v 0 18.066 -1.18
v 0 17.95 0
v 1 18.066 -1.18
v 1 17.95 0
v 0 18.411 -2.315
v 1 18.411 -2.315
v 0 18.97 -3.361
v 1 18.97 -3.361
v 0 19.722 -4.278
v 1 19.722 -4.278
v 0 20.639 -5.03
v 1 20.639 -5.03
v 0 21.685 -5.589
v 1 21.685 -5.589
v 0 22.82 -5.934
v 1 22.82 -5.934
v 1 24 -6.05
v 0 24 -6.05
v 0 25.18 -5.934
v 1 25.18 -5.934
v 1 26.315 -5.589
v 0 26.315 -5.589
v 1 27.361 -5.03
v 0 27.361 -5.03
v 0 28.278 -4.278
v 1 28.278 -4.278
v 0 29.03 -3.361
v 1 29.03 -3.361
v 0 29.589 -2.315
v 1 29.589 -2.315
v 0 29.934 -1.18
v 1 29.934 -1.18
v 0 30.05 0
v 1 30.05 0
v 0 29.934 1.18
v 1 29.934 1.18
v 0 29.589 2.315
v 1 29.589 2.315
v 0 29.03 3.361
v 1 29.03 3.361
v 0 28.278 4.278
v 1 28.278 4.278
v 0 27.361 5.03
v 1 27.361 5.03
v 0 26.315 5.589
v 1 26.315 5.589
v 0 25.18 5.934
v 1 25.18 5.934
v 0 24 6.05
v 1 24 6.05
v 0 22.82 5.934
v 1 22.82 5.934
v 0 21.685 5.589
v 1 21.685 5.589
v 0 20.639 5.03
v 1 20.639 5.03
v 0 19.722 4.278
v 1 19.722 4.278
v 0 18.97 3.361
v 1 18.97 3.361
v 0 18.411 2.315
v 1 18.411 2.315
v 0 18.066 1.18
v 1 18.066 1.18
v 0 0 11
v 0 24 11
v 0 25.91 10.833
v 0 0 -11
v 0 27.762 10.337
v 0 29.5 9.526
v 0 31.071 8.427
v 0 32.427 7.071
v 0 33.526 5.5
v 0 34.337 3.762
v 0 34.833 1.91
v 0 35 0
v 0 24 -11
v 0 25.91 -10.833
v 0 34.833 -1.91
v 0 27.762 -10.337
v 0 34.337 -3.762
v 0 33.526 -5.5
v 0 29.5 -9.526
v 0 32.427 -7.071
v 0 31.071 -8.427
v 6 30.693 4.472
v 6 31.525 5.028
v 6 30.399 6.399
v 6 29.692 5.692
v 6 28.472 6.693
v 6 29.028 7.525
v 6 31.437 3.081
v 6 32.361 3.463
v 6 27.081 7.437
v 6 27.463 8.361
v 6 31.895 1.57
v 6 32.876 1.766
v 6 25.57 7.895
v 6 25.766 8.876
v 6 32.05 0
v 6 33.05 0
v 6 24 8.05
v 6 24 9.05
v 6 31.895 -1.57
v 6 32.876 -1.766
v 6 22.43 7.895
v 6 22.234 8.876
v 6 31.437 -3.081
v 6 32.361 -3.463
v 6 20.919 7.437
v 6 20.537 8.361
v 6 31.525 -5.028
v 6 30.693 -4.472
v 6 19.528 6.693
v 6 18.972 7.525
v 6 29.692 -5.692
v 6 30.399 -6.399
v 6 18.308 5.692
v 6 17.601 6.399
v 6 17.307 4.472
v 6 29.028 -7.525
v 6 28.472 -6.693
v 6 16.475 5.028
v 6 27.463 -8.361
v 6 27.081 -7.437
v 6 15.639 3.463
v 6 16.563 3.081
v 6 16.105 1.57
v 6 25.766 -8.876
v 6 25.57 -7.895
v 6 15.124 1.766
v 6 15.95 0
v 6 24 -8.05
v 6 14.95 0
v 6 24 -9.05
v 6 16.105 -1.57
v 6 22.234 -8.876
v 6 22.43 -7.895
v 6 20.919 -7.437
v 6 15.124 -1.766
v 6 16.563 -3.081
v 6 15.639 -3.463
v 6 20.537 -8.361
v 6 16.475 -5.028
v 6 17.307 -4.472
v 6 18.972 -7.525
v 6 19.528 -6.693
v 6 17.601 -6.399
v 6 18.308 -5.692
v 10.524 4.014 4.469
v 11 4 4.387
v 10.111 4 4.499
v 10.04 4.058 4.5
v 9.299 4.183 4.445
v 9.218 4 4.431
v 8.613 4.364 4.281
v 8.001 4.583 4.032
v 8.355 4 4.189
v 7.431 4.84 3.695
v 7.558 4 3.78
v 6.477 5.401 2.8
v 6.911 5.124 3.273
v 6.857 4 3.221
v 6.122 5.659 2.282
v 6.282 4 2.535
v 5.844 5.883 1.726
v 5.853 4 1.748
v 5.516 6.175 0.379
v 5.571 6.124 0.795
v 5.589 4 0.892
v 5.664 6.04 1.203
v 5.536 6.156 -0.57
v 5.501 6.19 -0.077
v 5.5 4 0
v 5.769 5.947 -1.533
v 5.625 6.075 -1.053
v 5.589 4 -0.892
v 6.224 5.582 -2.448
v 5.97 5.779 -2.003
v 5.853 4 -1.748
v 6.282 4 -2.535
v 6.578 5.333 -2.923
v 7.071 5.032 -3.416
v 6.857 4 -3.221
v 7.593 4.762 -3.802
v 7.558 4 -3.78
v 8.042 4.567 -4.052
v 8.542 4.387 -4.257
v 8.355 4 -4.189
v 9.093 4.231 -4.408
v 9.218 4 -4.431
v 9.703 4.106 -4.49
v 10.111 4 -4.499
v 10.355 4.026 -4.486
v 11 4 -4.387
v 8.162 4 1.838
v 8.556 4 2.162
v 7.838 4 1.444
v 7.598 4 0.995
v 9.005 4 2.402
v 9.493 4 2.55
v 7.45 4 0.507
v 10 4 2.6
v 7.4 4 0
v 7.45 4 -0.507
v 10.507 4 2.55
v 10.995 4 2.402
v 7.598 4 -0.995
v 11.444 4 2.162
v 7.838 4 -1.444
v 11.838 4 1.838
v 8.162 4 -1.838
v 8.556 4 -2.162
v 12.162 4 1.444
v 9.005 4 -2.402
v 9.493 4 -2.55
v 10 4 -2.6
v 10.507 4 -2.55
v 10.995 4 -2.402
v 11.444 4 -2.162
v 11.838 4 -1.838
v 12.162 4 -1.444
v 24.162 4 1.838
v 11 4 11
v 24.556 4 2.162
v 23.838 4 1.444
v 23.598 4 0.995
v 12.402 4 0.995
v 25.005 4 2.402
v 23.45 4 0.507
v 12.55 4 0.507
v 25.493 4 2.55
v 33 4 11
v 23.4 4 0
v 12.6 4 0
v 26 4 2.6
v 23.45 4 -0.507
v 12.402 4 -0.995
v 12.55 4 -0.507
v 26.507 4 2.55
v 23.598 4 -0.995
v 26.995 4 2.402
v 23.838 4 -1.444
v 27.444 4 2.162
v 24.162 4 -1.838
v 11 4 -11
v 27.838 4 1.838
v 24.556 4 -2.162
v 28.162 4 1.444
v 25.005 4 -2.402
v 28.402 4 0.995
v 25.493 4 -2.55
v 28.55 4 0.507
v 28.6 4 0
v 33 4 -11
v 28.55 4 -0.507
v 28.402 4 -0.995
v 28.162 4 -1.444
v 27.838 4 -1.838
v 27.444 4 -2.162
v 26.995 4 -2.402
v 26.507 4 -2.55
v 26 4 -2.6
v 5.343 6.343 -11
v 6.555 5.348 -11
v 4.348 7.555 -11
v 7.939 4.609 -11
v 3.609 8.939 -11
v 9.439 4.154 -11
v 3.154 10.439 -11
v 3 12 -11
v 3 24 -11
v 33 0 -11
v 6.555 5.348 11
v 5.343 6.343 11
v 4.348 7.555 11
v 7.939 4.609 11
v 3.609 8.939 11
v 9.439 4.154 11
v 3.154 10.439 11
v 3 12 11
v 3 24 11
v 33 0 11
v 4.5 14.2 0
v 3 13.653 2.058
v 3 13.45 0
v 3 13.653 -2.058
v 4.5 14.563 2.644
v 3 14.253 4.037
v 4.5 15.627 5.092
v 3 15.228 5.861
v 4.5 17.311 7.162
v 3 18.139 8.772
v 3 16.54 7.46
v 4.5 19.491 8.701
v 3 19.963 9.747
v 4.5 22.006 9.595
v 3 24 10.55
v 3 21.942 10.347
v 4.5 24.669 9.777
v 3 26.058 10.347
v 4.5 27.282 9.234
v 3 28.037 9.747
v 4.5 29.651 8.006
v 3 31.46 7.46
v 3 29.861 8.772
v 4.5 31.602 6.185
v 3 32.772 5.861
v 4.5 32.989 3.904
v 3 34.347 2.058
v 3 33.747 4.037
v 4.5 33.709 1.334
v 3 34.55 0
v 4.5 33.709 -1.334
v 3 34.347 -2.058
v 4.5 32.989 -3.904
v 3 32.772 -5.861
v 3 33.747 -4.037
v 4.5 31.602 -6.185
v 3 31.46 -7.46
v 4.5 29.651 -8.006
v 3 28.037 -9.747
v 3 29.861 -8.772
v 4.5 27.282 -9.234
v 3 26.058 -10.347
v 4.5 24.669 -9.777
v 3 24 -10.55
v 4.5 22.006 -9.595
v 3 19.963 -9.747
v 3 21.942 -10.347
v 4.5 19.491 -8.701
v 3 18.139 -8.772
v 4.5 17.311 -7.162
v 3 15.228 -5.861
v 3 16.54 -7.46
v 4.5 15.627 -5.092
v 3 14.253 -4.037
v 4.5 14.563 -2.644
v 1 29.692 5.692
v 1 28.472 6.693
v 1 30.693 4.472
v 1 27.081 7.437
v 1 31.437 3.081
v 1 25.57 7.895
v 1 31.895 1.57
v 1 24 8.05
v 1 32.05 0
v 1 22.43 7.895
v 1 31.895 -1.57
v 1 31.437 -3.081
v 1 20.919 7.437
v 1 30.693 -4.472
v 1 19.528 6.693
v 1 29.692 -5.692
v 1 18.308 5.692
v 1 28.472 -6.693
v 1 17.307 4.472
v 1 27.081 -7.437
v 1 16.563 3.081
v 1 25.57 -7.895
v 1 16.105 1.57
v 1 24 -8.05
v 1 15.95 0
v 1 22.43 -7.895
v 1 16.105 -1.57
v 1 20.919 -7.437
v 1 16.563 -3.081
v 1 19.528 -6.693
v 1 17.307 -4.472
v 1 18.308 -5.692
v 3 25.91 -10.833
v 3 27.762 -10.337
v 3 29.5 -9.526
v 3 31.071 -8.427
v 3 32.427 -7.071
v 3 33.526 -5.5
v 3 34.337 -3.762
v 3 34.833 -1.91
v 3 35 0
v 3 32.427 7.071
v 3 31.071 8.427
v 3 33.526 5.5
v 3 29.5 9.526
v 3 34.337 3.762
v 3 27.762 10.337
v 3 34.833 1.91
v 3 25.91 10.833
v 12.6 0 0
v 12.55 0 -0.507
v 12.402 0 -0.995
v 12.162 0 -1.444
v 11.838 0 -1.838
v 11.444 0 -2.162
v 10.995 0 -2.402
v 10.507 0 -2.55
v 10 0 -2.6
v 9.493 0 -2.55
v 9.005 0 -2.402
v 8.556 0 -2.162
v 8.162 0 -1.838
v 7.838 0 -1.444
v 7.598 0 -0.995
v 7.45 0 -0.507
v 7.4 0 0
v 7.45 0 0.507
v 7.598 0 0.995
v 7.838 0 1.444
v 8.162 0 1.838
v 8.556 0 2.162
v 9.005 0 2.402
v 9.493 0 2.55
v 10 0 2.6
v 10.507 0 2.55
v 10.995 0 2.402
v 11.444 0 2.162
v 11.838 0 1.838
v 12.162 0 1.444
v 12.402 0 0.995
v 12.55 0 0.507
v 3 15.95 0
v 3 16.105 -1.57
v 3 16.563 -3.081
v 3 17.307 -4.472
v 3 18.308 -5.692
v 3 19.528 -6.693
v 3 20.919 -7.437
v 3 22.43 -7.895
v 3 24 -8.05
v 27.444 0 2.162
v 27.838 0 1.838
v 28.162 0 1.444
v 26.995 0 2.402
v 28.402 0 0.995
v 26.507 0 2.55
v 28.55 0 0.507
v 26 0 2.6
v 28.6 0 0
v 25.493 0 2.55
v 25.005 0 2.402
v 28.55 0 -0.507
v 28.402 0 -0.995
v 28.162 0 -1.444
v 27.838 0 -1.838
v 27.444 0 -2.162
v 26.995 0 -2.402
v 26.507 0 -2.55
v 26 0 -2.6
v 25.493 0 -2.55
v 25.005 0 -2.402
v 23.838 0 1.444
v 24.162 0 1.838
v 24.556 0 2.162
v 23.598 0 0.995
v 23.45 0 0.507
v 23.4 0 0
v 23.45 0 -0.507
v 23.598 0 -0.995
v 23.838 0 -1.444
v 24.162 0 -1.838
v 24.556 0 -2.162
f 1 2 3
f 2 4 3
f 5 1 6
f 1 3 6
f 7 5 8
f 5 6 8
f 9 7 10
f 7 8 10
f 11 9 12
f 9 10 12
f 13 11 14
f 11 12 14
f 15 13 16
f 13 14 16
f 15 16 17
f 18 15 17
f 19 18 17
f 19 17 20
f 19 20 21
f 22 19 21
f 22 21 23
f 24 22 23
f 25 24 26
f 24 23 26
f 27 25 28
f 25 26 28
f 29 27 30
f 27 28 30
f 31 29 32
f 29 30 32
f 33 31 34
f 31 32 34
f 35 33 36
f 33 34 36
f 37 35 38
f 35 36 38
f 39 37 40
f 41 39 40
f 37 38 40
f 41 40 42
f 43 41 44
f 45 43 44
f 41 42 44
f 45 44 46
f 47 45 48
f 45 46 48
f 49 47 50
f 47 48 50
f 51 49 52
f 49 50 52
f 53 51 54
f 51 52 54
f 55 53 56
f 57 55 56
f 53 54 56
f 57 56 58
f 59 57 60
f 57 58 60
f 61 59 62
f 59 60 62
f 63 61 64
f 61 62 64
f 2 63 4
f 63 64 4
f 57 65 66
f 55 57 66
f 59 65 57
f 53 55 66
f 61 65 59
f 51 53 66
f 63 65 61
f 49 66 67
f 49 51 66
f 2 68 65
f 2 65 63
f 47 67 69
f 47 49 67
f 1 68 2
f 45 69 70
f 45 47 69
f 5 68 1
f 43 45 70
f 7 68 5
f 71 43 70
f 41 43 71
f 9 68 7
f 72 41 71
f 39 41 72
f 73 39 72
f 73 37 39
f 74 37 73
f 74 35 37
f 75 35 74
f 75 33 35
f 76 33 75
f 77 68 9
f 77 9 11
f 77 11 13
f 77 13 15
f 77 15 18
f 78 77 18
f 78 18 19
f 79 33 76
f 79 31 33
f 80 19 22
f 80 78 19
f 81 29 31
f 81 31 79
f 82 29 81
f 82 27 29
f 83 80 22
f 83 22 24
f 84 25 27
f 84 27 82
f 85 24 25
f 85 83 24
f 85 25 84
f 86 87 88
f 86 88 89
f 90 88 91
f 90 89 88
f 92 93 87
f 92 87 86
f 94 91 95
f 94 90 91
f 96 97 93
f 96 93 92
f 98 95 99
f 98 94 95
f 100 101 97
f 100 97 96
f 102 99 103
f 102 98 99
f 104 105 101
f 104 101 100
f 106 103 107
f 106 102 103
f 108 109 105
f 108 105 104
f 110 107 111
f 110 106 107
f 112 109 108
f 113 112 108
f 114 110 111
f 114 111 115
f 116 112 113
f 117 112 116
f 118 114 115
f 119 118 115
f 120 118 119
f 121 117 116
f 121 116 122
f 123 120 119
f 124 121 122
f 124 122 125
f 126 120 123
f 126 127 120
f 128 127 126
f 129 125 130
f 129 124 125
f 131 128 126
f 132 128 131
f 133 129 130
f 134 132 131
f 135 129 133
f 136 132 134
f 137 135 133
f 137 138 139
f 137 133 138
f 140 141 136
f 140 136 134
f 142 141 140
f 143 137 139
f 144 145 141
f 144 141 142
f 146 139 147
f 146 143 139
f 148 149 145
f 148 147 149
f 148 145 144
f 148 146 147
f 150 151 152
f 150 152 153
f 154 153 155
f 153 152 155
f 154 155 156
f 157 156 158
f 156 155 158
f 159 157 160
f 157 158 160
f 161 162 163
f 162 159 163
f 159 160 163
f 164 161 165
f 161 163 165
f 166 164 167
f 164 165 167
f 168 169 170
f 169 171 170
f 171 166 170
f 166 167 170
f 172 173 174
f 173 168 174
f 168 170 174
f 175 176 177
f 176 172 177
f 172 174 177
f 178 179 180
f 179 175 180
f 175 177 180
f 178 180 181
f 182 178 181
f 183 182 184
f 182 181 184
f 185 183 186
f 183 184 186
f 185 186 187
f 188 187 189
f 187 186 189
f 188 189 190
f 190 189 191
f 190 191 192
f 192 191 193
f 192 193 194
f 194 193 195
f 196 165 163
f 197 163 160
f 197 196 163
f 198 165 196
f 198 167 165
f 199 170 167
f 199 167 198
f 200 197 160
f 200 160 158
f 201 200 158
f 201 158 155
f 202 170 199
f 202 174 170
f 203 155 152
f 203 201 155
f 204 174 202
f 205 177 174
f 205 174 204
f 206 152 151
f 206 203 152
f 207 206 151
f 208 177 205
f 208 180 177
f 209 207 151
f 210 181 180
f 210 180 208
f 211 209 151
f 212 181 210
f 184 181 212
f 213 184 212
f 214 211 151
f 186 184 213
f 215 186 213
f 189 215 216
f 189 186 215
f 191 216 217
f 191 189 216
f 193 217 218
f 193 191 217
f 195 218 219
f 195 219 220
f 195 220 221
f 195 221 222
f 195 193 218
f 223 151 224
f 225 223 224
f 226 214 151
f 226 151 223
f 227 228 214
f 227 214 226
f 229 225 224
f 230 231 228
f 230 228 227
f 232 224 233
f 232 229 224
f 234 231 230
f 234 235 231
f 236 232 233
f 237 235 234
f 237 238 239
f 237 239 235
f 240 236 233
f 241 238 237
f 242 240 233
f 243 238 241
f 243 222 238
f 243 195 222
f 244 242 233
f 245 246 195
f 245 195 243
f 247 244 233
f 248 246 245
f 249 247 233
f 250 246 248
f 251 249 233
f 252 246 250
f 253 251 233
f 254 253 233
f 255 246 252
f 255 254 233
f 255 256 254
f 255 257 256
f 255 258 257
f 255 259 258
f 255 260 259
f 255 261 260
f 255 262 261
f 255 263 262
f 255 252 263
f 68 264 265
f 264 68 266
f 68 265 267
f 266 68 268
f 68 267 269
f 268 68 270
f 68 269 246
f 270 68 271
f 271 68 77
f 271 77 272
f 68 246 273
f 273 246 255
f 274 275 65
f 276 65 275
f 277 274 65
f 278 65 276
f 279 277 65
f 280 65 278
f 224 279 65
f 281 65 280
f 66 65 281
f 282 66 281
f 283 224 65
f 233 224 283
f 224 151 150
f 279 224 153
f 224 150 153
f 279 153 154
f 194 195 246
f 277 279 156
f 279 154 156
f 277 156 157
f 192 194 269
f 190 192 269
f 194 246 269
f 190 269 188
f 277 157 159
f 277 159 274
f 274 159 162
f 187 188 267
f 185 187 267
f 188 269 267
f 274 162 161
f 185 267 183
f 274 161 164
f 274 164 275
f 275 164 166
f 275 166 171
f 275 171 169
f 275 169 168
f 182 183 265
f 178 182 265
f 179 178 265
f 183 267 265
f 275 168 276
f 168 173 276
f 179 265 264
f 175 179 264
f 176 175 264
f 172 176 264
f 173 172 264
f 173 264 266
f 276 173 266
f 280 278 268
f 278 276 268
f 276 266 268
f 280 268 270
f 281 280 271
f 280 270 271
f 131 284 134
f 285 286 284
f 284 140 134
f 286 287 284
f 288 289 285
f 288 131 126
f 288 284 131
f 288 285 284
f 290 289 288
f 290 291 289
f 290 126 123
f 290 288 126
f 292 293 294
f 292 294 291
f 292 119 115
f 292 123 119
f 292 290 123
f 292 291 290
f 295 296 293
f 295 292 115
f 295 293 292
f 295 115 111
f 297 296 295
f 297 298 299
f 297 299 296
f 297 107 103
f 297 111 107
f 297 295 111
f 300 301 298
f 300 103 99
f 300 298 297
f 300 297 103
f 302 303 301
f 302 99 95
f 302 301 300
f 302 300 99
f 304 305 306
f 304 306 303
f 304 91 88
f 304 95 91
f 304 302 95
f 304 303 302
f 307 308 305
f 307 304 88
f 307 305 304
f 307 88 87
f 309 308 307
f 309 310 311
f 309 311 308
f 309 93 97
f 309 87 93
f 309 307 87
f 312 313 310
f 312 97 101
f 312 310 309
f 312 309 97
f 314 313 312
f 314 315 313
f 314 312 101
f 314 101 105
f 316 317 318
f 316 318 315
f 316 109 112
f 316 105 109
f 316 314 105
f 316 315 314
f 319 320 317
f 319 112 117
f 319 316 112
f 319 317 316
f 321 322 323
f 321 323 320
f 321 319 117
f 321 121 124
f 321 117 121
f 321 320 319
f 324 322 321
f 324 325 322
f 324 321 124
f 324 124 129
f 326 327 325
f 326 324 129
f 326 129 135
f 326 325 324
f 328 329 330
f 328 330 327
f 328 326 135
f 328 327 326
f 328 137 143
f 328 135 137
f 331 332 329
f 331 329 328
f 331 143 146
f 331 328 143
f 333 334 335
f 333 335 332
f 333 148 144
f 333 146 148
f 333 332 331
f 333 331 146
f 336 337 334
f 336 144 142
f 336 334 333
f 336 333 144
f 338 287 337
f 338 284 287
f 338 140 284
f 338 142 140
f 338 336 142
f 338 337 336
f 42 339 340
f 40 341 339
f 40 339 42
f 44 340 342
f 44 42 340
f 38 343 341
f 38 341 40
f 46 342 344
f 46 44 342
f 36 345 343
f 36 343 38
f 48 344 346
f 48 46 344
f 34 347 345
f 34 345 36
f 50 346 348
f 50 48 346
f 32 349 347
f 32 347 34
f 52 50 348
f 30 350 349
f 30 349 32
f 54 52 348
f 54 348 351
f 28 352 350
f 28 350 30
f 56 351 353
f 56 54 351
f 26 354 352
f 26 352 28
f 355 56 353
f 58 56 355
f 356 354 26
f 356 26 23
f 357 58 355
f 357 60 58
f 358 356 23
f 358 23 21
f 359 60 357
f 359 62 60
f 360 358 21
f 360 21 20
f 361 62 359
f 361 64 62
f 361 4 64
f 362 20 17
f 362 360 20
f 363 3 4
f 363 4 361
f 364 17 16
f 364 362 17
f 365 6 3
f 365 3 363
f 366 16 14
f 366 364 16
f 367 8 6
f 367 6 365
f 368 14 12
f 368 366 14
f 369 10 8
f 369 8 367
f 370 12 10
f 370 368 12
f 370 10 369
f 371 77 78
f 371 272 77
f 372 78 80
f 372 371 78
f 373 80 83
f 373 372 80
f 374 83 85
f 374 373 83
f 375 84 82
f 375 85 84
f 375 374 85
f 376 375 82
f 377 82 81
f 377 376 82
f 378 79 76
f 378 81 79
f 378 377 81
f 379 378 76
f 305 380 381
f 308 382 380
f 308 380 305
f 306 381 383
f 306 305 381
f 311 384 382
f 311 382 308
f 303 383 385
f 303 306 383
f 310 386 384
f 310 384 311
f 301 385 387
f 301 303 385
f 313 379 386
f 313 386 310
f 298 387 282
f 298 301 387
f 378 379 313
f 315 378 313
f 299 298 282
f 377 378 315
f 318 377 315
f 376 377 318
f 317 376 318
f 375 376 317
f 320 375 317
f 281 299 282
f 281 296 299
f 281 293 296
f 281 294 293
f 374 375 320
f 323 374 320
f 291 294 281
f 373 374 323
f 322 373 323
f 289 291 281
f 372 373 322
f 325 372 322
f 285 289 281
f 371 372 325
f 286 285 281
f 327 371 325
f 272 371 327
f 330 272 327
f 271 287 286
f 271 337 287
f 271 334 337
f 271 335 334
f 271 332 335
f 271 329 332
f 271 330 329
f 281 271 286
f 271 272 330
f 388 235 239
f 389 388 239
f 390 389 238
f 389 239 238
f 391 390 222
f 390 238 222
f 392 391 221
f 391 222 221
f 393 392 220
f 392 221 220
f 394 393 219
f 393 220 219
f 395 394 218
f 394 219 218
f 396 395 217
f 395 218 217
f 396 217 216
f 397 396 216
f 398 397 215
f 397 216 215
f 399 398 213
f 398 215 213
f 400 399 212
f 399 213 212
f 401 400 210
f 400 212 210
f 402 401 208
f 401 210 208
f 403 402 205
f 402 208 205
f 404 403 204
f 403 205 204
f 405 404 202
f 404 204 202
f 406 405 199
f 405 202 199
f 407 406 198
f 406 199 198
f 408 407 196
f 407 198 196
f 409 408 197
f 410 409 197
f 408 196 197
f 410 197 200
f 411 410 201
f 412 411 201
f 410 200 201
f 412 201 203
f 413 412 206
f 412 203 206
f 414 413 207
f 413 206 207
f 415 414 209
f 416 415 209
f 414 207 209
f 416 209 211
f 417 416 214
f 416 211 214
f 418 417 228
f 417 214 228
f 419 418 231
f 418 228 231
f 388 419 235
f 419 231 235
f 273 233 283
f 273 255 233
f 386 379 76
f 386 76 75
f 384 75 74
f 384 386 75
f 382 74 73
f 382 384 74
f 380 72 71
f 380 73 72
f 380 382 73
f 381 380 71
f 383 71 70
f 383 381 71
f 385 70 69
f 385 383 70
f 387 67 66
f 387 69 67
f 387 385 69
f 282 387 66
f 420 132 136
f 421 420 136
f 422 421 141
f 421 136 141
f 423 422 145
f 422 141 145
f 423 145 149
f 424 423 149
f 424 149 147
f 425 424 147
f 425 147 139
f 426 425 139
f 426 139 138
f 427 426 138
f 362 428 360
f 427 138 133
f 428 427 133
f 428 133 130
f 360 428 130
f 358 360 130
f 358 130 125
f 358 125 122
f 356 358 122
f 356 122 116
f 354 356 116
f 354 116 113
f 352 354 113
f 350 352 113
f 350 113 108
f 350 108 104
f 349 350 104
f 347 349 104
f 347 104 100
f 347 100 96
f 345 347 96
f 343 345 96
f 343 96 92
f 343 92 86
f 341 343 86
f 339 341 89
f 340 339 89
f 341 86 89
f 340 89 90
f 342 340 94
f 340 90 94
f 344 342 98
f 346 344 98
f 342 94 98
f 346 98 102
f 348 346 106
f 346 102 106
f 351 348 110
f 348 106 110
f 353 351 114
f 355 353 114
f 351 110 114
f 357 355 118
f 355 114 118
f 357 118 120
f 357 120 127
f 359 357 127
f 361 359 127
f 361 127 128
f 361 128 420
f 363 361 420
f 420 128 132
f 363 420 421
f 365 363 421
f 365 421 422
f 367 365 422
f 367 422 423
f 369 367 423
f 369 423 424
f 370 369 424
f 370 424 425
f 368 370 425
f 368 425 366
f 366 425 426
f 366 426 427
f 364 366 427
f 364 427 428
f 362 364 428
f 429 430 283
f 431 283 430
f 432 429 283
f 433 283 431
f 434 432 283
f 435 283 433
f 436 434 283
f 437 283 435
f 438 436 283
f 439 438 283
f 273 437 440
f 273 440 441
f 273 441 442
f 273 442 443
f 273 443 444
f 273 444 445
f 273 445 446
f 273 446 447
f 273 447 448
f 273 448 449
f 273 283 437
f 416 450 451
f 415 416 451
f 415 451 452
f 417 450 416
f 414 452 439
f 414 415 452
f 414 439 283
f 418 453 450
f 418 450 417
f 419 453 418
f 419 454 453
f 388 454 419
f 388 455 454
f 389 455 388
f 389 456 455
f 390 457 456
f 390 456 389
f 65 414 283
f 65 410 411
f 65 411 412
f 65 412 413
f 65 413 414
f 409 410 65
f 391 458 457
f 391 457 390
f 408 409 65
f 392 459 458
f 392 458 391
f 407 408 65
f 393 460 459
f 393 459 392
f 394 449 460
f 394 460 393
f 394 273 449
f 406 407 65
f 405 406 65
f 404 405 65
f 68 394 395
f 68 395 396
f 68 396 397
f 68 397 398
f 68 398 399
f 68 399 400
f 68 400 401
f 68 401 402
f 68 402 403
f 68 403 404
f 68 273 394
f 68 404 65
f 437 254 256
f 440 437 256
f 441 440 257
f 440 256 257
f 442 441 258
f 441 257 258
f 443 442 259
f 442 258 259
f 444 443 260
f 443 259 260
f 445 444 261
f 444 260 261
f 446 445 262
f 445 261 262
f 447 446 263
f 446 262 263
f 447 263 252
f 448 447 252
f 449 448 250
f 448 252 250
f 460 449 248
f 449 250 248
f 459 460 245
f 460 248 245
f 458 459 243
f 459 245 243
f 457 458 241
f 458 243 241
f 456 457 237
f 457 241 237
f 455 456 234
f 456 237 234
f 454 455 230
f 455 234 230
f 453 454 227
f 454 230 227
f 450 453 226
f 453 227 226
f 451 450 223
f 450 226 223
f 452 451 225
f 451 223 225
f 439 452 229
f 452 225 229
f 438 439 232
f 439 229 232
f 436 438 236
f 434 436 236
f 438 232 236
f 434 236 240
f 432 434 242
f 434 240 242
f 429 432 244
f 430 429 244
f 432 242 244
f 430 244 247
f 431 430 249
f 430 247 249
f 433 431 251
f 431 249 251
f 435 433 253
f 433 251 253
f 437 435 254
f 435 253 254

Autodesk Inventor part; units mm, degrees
ref_plane "YZ Plane" through (0, 0, 0) normal (1, 0, 0) x (0, 1, 0)
ref_plane "XZ Plane" through (0, 0, 0) normal (0, 1, 0) x (-1, 0, 0)
ref_plane "XY Plane" through (0, 0, 0) normal (0, 0, 1) x (1, 0, 0)
sketch "Sketch3" plane through (0, 0, 0) normal (0, 0, 1) x (1, 0, 0)
  line L0 (0, 0) -> (0, 35)
  line L1 (0, 35) -> (3, 35)
  line L2 (3, 35) -> (3, 4)
  line L3 (3, 4) -> (33, 4)
  line L4 (33, 4) -> (33, 0)
  line L5 (33, 0) -> (0, 0)
  line L6 (0, 25) -> (3, 25) construction
  dimension "d0" = 10
  dimension "d1" = 25
  dimension "d2" = 30
  dimension "d3" = 4
  dimension "d4" = 3
extrude "Extrusion1" add sketch "Sketch3" along normal mid plane 22
sketch "Sketch4" plane through (3, 4, -11) normal (1, 0, 0) x (0, 0, -1)
  line L0 (0, 31) -> (-22, 31) construction
  line L1 (-11, 31) -> (-11, 20) construction
  circle A0 centre (-11, 20) radius 8.05
  point P0 (-11, -4)
  dimension "d7" = 11
  dimension "d8" = 16.1
extrude "Extrusion2" cut sketch "Sketch4" against normal through all
fillet "Fillet3" radius 8 1 edges at (3, 4, 0)
sketch "Sketch5" plane through (3, 4, -11) normal (0, 1, 0) x (1, 0, 0)
  line L0 (30, 0) -> (30, -22) construction
  line L1 (30, -11) -> (0, -11) construction
  line L2 (0, 0) -> (0, -22) construction
  circle A0 centre (7, -11) radius 2.6
  circle A1 centre (23, -11) radius 2.6
  point P0 (-3, -11)
  dimension "d11" = 7
  dimension "d12" = 7
  dimension "d13" = 5.2
extrude "Extrusion3" cut sketch "Sketch5" along normal mid plane 24.75
sketch "Sketch6" plane through (0, 0, 0) normal (0, 0, 1) x (1, 0, 0)
  line L0 (3, 15.95) -> (0, 15.95) construction
  line L1 (0, 15.95) -> (0, 17.95)
  line L2 (0, 17.95) -> (1, 17.95)
  line L3 (1, 17.95) -> (1, 15.95)
  line L4 (0, 15.95) -> (0, 32.05) construction
  line L5 (1, 15.95) -> (0, 15.95)
  line L6 (3, 32.05) -> (3, 15.95) construction
  line L7 (3, 15.95) -> (6, 15.95)
  line L8 (6, 15.95) -> (6, 14.95)
  line L9 (6, 14.95) -> (3, 13.45)
  line L10 (3, 13.45) -> (3, 15.95)
  line L11 (0, 24) -> (3, 24) construction
  point P0 (0, 0)
  dimension "d16" = 1
  dimension "d17" = 2
  dimension "d18" = 5
  dimension "d19" = 2.5
  dimension "d20" = 1
revolve "Revolution1" add sketch "Sketch6" angle 360 about axis through (0, 24, 0) along (1, 0, 0)
fillet "Fillet1" radius 11 2 edges at (1.5, 35, 11) (1.5, 35, -11)
sketch "Sketch11" plane through (33, 4, 11) normal (0, 1, 0) x (1, 0, 0)
  circle A0 centre (-23, 11) radius 2.6 projected
  circle A1 centre (-23, 11) radius 4.5
  point P0 (-33, 11)
  dimension "d42" = 9
extrude "Extrusion8" cut sketch "Sketch11" along normal blind 5 contours A0 | A1
properties part number "Winder_idler"
